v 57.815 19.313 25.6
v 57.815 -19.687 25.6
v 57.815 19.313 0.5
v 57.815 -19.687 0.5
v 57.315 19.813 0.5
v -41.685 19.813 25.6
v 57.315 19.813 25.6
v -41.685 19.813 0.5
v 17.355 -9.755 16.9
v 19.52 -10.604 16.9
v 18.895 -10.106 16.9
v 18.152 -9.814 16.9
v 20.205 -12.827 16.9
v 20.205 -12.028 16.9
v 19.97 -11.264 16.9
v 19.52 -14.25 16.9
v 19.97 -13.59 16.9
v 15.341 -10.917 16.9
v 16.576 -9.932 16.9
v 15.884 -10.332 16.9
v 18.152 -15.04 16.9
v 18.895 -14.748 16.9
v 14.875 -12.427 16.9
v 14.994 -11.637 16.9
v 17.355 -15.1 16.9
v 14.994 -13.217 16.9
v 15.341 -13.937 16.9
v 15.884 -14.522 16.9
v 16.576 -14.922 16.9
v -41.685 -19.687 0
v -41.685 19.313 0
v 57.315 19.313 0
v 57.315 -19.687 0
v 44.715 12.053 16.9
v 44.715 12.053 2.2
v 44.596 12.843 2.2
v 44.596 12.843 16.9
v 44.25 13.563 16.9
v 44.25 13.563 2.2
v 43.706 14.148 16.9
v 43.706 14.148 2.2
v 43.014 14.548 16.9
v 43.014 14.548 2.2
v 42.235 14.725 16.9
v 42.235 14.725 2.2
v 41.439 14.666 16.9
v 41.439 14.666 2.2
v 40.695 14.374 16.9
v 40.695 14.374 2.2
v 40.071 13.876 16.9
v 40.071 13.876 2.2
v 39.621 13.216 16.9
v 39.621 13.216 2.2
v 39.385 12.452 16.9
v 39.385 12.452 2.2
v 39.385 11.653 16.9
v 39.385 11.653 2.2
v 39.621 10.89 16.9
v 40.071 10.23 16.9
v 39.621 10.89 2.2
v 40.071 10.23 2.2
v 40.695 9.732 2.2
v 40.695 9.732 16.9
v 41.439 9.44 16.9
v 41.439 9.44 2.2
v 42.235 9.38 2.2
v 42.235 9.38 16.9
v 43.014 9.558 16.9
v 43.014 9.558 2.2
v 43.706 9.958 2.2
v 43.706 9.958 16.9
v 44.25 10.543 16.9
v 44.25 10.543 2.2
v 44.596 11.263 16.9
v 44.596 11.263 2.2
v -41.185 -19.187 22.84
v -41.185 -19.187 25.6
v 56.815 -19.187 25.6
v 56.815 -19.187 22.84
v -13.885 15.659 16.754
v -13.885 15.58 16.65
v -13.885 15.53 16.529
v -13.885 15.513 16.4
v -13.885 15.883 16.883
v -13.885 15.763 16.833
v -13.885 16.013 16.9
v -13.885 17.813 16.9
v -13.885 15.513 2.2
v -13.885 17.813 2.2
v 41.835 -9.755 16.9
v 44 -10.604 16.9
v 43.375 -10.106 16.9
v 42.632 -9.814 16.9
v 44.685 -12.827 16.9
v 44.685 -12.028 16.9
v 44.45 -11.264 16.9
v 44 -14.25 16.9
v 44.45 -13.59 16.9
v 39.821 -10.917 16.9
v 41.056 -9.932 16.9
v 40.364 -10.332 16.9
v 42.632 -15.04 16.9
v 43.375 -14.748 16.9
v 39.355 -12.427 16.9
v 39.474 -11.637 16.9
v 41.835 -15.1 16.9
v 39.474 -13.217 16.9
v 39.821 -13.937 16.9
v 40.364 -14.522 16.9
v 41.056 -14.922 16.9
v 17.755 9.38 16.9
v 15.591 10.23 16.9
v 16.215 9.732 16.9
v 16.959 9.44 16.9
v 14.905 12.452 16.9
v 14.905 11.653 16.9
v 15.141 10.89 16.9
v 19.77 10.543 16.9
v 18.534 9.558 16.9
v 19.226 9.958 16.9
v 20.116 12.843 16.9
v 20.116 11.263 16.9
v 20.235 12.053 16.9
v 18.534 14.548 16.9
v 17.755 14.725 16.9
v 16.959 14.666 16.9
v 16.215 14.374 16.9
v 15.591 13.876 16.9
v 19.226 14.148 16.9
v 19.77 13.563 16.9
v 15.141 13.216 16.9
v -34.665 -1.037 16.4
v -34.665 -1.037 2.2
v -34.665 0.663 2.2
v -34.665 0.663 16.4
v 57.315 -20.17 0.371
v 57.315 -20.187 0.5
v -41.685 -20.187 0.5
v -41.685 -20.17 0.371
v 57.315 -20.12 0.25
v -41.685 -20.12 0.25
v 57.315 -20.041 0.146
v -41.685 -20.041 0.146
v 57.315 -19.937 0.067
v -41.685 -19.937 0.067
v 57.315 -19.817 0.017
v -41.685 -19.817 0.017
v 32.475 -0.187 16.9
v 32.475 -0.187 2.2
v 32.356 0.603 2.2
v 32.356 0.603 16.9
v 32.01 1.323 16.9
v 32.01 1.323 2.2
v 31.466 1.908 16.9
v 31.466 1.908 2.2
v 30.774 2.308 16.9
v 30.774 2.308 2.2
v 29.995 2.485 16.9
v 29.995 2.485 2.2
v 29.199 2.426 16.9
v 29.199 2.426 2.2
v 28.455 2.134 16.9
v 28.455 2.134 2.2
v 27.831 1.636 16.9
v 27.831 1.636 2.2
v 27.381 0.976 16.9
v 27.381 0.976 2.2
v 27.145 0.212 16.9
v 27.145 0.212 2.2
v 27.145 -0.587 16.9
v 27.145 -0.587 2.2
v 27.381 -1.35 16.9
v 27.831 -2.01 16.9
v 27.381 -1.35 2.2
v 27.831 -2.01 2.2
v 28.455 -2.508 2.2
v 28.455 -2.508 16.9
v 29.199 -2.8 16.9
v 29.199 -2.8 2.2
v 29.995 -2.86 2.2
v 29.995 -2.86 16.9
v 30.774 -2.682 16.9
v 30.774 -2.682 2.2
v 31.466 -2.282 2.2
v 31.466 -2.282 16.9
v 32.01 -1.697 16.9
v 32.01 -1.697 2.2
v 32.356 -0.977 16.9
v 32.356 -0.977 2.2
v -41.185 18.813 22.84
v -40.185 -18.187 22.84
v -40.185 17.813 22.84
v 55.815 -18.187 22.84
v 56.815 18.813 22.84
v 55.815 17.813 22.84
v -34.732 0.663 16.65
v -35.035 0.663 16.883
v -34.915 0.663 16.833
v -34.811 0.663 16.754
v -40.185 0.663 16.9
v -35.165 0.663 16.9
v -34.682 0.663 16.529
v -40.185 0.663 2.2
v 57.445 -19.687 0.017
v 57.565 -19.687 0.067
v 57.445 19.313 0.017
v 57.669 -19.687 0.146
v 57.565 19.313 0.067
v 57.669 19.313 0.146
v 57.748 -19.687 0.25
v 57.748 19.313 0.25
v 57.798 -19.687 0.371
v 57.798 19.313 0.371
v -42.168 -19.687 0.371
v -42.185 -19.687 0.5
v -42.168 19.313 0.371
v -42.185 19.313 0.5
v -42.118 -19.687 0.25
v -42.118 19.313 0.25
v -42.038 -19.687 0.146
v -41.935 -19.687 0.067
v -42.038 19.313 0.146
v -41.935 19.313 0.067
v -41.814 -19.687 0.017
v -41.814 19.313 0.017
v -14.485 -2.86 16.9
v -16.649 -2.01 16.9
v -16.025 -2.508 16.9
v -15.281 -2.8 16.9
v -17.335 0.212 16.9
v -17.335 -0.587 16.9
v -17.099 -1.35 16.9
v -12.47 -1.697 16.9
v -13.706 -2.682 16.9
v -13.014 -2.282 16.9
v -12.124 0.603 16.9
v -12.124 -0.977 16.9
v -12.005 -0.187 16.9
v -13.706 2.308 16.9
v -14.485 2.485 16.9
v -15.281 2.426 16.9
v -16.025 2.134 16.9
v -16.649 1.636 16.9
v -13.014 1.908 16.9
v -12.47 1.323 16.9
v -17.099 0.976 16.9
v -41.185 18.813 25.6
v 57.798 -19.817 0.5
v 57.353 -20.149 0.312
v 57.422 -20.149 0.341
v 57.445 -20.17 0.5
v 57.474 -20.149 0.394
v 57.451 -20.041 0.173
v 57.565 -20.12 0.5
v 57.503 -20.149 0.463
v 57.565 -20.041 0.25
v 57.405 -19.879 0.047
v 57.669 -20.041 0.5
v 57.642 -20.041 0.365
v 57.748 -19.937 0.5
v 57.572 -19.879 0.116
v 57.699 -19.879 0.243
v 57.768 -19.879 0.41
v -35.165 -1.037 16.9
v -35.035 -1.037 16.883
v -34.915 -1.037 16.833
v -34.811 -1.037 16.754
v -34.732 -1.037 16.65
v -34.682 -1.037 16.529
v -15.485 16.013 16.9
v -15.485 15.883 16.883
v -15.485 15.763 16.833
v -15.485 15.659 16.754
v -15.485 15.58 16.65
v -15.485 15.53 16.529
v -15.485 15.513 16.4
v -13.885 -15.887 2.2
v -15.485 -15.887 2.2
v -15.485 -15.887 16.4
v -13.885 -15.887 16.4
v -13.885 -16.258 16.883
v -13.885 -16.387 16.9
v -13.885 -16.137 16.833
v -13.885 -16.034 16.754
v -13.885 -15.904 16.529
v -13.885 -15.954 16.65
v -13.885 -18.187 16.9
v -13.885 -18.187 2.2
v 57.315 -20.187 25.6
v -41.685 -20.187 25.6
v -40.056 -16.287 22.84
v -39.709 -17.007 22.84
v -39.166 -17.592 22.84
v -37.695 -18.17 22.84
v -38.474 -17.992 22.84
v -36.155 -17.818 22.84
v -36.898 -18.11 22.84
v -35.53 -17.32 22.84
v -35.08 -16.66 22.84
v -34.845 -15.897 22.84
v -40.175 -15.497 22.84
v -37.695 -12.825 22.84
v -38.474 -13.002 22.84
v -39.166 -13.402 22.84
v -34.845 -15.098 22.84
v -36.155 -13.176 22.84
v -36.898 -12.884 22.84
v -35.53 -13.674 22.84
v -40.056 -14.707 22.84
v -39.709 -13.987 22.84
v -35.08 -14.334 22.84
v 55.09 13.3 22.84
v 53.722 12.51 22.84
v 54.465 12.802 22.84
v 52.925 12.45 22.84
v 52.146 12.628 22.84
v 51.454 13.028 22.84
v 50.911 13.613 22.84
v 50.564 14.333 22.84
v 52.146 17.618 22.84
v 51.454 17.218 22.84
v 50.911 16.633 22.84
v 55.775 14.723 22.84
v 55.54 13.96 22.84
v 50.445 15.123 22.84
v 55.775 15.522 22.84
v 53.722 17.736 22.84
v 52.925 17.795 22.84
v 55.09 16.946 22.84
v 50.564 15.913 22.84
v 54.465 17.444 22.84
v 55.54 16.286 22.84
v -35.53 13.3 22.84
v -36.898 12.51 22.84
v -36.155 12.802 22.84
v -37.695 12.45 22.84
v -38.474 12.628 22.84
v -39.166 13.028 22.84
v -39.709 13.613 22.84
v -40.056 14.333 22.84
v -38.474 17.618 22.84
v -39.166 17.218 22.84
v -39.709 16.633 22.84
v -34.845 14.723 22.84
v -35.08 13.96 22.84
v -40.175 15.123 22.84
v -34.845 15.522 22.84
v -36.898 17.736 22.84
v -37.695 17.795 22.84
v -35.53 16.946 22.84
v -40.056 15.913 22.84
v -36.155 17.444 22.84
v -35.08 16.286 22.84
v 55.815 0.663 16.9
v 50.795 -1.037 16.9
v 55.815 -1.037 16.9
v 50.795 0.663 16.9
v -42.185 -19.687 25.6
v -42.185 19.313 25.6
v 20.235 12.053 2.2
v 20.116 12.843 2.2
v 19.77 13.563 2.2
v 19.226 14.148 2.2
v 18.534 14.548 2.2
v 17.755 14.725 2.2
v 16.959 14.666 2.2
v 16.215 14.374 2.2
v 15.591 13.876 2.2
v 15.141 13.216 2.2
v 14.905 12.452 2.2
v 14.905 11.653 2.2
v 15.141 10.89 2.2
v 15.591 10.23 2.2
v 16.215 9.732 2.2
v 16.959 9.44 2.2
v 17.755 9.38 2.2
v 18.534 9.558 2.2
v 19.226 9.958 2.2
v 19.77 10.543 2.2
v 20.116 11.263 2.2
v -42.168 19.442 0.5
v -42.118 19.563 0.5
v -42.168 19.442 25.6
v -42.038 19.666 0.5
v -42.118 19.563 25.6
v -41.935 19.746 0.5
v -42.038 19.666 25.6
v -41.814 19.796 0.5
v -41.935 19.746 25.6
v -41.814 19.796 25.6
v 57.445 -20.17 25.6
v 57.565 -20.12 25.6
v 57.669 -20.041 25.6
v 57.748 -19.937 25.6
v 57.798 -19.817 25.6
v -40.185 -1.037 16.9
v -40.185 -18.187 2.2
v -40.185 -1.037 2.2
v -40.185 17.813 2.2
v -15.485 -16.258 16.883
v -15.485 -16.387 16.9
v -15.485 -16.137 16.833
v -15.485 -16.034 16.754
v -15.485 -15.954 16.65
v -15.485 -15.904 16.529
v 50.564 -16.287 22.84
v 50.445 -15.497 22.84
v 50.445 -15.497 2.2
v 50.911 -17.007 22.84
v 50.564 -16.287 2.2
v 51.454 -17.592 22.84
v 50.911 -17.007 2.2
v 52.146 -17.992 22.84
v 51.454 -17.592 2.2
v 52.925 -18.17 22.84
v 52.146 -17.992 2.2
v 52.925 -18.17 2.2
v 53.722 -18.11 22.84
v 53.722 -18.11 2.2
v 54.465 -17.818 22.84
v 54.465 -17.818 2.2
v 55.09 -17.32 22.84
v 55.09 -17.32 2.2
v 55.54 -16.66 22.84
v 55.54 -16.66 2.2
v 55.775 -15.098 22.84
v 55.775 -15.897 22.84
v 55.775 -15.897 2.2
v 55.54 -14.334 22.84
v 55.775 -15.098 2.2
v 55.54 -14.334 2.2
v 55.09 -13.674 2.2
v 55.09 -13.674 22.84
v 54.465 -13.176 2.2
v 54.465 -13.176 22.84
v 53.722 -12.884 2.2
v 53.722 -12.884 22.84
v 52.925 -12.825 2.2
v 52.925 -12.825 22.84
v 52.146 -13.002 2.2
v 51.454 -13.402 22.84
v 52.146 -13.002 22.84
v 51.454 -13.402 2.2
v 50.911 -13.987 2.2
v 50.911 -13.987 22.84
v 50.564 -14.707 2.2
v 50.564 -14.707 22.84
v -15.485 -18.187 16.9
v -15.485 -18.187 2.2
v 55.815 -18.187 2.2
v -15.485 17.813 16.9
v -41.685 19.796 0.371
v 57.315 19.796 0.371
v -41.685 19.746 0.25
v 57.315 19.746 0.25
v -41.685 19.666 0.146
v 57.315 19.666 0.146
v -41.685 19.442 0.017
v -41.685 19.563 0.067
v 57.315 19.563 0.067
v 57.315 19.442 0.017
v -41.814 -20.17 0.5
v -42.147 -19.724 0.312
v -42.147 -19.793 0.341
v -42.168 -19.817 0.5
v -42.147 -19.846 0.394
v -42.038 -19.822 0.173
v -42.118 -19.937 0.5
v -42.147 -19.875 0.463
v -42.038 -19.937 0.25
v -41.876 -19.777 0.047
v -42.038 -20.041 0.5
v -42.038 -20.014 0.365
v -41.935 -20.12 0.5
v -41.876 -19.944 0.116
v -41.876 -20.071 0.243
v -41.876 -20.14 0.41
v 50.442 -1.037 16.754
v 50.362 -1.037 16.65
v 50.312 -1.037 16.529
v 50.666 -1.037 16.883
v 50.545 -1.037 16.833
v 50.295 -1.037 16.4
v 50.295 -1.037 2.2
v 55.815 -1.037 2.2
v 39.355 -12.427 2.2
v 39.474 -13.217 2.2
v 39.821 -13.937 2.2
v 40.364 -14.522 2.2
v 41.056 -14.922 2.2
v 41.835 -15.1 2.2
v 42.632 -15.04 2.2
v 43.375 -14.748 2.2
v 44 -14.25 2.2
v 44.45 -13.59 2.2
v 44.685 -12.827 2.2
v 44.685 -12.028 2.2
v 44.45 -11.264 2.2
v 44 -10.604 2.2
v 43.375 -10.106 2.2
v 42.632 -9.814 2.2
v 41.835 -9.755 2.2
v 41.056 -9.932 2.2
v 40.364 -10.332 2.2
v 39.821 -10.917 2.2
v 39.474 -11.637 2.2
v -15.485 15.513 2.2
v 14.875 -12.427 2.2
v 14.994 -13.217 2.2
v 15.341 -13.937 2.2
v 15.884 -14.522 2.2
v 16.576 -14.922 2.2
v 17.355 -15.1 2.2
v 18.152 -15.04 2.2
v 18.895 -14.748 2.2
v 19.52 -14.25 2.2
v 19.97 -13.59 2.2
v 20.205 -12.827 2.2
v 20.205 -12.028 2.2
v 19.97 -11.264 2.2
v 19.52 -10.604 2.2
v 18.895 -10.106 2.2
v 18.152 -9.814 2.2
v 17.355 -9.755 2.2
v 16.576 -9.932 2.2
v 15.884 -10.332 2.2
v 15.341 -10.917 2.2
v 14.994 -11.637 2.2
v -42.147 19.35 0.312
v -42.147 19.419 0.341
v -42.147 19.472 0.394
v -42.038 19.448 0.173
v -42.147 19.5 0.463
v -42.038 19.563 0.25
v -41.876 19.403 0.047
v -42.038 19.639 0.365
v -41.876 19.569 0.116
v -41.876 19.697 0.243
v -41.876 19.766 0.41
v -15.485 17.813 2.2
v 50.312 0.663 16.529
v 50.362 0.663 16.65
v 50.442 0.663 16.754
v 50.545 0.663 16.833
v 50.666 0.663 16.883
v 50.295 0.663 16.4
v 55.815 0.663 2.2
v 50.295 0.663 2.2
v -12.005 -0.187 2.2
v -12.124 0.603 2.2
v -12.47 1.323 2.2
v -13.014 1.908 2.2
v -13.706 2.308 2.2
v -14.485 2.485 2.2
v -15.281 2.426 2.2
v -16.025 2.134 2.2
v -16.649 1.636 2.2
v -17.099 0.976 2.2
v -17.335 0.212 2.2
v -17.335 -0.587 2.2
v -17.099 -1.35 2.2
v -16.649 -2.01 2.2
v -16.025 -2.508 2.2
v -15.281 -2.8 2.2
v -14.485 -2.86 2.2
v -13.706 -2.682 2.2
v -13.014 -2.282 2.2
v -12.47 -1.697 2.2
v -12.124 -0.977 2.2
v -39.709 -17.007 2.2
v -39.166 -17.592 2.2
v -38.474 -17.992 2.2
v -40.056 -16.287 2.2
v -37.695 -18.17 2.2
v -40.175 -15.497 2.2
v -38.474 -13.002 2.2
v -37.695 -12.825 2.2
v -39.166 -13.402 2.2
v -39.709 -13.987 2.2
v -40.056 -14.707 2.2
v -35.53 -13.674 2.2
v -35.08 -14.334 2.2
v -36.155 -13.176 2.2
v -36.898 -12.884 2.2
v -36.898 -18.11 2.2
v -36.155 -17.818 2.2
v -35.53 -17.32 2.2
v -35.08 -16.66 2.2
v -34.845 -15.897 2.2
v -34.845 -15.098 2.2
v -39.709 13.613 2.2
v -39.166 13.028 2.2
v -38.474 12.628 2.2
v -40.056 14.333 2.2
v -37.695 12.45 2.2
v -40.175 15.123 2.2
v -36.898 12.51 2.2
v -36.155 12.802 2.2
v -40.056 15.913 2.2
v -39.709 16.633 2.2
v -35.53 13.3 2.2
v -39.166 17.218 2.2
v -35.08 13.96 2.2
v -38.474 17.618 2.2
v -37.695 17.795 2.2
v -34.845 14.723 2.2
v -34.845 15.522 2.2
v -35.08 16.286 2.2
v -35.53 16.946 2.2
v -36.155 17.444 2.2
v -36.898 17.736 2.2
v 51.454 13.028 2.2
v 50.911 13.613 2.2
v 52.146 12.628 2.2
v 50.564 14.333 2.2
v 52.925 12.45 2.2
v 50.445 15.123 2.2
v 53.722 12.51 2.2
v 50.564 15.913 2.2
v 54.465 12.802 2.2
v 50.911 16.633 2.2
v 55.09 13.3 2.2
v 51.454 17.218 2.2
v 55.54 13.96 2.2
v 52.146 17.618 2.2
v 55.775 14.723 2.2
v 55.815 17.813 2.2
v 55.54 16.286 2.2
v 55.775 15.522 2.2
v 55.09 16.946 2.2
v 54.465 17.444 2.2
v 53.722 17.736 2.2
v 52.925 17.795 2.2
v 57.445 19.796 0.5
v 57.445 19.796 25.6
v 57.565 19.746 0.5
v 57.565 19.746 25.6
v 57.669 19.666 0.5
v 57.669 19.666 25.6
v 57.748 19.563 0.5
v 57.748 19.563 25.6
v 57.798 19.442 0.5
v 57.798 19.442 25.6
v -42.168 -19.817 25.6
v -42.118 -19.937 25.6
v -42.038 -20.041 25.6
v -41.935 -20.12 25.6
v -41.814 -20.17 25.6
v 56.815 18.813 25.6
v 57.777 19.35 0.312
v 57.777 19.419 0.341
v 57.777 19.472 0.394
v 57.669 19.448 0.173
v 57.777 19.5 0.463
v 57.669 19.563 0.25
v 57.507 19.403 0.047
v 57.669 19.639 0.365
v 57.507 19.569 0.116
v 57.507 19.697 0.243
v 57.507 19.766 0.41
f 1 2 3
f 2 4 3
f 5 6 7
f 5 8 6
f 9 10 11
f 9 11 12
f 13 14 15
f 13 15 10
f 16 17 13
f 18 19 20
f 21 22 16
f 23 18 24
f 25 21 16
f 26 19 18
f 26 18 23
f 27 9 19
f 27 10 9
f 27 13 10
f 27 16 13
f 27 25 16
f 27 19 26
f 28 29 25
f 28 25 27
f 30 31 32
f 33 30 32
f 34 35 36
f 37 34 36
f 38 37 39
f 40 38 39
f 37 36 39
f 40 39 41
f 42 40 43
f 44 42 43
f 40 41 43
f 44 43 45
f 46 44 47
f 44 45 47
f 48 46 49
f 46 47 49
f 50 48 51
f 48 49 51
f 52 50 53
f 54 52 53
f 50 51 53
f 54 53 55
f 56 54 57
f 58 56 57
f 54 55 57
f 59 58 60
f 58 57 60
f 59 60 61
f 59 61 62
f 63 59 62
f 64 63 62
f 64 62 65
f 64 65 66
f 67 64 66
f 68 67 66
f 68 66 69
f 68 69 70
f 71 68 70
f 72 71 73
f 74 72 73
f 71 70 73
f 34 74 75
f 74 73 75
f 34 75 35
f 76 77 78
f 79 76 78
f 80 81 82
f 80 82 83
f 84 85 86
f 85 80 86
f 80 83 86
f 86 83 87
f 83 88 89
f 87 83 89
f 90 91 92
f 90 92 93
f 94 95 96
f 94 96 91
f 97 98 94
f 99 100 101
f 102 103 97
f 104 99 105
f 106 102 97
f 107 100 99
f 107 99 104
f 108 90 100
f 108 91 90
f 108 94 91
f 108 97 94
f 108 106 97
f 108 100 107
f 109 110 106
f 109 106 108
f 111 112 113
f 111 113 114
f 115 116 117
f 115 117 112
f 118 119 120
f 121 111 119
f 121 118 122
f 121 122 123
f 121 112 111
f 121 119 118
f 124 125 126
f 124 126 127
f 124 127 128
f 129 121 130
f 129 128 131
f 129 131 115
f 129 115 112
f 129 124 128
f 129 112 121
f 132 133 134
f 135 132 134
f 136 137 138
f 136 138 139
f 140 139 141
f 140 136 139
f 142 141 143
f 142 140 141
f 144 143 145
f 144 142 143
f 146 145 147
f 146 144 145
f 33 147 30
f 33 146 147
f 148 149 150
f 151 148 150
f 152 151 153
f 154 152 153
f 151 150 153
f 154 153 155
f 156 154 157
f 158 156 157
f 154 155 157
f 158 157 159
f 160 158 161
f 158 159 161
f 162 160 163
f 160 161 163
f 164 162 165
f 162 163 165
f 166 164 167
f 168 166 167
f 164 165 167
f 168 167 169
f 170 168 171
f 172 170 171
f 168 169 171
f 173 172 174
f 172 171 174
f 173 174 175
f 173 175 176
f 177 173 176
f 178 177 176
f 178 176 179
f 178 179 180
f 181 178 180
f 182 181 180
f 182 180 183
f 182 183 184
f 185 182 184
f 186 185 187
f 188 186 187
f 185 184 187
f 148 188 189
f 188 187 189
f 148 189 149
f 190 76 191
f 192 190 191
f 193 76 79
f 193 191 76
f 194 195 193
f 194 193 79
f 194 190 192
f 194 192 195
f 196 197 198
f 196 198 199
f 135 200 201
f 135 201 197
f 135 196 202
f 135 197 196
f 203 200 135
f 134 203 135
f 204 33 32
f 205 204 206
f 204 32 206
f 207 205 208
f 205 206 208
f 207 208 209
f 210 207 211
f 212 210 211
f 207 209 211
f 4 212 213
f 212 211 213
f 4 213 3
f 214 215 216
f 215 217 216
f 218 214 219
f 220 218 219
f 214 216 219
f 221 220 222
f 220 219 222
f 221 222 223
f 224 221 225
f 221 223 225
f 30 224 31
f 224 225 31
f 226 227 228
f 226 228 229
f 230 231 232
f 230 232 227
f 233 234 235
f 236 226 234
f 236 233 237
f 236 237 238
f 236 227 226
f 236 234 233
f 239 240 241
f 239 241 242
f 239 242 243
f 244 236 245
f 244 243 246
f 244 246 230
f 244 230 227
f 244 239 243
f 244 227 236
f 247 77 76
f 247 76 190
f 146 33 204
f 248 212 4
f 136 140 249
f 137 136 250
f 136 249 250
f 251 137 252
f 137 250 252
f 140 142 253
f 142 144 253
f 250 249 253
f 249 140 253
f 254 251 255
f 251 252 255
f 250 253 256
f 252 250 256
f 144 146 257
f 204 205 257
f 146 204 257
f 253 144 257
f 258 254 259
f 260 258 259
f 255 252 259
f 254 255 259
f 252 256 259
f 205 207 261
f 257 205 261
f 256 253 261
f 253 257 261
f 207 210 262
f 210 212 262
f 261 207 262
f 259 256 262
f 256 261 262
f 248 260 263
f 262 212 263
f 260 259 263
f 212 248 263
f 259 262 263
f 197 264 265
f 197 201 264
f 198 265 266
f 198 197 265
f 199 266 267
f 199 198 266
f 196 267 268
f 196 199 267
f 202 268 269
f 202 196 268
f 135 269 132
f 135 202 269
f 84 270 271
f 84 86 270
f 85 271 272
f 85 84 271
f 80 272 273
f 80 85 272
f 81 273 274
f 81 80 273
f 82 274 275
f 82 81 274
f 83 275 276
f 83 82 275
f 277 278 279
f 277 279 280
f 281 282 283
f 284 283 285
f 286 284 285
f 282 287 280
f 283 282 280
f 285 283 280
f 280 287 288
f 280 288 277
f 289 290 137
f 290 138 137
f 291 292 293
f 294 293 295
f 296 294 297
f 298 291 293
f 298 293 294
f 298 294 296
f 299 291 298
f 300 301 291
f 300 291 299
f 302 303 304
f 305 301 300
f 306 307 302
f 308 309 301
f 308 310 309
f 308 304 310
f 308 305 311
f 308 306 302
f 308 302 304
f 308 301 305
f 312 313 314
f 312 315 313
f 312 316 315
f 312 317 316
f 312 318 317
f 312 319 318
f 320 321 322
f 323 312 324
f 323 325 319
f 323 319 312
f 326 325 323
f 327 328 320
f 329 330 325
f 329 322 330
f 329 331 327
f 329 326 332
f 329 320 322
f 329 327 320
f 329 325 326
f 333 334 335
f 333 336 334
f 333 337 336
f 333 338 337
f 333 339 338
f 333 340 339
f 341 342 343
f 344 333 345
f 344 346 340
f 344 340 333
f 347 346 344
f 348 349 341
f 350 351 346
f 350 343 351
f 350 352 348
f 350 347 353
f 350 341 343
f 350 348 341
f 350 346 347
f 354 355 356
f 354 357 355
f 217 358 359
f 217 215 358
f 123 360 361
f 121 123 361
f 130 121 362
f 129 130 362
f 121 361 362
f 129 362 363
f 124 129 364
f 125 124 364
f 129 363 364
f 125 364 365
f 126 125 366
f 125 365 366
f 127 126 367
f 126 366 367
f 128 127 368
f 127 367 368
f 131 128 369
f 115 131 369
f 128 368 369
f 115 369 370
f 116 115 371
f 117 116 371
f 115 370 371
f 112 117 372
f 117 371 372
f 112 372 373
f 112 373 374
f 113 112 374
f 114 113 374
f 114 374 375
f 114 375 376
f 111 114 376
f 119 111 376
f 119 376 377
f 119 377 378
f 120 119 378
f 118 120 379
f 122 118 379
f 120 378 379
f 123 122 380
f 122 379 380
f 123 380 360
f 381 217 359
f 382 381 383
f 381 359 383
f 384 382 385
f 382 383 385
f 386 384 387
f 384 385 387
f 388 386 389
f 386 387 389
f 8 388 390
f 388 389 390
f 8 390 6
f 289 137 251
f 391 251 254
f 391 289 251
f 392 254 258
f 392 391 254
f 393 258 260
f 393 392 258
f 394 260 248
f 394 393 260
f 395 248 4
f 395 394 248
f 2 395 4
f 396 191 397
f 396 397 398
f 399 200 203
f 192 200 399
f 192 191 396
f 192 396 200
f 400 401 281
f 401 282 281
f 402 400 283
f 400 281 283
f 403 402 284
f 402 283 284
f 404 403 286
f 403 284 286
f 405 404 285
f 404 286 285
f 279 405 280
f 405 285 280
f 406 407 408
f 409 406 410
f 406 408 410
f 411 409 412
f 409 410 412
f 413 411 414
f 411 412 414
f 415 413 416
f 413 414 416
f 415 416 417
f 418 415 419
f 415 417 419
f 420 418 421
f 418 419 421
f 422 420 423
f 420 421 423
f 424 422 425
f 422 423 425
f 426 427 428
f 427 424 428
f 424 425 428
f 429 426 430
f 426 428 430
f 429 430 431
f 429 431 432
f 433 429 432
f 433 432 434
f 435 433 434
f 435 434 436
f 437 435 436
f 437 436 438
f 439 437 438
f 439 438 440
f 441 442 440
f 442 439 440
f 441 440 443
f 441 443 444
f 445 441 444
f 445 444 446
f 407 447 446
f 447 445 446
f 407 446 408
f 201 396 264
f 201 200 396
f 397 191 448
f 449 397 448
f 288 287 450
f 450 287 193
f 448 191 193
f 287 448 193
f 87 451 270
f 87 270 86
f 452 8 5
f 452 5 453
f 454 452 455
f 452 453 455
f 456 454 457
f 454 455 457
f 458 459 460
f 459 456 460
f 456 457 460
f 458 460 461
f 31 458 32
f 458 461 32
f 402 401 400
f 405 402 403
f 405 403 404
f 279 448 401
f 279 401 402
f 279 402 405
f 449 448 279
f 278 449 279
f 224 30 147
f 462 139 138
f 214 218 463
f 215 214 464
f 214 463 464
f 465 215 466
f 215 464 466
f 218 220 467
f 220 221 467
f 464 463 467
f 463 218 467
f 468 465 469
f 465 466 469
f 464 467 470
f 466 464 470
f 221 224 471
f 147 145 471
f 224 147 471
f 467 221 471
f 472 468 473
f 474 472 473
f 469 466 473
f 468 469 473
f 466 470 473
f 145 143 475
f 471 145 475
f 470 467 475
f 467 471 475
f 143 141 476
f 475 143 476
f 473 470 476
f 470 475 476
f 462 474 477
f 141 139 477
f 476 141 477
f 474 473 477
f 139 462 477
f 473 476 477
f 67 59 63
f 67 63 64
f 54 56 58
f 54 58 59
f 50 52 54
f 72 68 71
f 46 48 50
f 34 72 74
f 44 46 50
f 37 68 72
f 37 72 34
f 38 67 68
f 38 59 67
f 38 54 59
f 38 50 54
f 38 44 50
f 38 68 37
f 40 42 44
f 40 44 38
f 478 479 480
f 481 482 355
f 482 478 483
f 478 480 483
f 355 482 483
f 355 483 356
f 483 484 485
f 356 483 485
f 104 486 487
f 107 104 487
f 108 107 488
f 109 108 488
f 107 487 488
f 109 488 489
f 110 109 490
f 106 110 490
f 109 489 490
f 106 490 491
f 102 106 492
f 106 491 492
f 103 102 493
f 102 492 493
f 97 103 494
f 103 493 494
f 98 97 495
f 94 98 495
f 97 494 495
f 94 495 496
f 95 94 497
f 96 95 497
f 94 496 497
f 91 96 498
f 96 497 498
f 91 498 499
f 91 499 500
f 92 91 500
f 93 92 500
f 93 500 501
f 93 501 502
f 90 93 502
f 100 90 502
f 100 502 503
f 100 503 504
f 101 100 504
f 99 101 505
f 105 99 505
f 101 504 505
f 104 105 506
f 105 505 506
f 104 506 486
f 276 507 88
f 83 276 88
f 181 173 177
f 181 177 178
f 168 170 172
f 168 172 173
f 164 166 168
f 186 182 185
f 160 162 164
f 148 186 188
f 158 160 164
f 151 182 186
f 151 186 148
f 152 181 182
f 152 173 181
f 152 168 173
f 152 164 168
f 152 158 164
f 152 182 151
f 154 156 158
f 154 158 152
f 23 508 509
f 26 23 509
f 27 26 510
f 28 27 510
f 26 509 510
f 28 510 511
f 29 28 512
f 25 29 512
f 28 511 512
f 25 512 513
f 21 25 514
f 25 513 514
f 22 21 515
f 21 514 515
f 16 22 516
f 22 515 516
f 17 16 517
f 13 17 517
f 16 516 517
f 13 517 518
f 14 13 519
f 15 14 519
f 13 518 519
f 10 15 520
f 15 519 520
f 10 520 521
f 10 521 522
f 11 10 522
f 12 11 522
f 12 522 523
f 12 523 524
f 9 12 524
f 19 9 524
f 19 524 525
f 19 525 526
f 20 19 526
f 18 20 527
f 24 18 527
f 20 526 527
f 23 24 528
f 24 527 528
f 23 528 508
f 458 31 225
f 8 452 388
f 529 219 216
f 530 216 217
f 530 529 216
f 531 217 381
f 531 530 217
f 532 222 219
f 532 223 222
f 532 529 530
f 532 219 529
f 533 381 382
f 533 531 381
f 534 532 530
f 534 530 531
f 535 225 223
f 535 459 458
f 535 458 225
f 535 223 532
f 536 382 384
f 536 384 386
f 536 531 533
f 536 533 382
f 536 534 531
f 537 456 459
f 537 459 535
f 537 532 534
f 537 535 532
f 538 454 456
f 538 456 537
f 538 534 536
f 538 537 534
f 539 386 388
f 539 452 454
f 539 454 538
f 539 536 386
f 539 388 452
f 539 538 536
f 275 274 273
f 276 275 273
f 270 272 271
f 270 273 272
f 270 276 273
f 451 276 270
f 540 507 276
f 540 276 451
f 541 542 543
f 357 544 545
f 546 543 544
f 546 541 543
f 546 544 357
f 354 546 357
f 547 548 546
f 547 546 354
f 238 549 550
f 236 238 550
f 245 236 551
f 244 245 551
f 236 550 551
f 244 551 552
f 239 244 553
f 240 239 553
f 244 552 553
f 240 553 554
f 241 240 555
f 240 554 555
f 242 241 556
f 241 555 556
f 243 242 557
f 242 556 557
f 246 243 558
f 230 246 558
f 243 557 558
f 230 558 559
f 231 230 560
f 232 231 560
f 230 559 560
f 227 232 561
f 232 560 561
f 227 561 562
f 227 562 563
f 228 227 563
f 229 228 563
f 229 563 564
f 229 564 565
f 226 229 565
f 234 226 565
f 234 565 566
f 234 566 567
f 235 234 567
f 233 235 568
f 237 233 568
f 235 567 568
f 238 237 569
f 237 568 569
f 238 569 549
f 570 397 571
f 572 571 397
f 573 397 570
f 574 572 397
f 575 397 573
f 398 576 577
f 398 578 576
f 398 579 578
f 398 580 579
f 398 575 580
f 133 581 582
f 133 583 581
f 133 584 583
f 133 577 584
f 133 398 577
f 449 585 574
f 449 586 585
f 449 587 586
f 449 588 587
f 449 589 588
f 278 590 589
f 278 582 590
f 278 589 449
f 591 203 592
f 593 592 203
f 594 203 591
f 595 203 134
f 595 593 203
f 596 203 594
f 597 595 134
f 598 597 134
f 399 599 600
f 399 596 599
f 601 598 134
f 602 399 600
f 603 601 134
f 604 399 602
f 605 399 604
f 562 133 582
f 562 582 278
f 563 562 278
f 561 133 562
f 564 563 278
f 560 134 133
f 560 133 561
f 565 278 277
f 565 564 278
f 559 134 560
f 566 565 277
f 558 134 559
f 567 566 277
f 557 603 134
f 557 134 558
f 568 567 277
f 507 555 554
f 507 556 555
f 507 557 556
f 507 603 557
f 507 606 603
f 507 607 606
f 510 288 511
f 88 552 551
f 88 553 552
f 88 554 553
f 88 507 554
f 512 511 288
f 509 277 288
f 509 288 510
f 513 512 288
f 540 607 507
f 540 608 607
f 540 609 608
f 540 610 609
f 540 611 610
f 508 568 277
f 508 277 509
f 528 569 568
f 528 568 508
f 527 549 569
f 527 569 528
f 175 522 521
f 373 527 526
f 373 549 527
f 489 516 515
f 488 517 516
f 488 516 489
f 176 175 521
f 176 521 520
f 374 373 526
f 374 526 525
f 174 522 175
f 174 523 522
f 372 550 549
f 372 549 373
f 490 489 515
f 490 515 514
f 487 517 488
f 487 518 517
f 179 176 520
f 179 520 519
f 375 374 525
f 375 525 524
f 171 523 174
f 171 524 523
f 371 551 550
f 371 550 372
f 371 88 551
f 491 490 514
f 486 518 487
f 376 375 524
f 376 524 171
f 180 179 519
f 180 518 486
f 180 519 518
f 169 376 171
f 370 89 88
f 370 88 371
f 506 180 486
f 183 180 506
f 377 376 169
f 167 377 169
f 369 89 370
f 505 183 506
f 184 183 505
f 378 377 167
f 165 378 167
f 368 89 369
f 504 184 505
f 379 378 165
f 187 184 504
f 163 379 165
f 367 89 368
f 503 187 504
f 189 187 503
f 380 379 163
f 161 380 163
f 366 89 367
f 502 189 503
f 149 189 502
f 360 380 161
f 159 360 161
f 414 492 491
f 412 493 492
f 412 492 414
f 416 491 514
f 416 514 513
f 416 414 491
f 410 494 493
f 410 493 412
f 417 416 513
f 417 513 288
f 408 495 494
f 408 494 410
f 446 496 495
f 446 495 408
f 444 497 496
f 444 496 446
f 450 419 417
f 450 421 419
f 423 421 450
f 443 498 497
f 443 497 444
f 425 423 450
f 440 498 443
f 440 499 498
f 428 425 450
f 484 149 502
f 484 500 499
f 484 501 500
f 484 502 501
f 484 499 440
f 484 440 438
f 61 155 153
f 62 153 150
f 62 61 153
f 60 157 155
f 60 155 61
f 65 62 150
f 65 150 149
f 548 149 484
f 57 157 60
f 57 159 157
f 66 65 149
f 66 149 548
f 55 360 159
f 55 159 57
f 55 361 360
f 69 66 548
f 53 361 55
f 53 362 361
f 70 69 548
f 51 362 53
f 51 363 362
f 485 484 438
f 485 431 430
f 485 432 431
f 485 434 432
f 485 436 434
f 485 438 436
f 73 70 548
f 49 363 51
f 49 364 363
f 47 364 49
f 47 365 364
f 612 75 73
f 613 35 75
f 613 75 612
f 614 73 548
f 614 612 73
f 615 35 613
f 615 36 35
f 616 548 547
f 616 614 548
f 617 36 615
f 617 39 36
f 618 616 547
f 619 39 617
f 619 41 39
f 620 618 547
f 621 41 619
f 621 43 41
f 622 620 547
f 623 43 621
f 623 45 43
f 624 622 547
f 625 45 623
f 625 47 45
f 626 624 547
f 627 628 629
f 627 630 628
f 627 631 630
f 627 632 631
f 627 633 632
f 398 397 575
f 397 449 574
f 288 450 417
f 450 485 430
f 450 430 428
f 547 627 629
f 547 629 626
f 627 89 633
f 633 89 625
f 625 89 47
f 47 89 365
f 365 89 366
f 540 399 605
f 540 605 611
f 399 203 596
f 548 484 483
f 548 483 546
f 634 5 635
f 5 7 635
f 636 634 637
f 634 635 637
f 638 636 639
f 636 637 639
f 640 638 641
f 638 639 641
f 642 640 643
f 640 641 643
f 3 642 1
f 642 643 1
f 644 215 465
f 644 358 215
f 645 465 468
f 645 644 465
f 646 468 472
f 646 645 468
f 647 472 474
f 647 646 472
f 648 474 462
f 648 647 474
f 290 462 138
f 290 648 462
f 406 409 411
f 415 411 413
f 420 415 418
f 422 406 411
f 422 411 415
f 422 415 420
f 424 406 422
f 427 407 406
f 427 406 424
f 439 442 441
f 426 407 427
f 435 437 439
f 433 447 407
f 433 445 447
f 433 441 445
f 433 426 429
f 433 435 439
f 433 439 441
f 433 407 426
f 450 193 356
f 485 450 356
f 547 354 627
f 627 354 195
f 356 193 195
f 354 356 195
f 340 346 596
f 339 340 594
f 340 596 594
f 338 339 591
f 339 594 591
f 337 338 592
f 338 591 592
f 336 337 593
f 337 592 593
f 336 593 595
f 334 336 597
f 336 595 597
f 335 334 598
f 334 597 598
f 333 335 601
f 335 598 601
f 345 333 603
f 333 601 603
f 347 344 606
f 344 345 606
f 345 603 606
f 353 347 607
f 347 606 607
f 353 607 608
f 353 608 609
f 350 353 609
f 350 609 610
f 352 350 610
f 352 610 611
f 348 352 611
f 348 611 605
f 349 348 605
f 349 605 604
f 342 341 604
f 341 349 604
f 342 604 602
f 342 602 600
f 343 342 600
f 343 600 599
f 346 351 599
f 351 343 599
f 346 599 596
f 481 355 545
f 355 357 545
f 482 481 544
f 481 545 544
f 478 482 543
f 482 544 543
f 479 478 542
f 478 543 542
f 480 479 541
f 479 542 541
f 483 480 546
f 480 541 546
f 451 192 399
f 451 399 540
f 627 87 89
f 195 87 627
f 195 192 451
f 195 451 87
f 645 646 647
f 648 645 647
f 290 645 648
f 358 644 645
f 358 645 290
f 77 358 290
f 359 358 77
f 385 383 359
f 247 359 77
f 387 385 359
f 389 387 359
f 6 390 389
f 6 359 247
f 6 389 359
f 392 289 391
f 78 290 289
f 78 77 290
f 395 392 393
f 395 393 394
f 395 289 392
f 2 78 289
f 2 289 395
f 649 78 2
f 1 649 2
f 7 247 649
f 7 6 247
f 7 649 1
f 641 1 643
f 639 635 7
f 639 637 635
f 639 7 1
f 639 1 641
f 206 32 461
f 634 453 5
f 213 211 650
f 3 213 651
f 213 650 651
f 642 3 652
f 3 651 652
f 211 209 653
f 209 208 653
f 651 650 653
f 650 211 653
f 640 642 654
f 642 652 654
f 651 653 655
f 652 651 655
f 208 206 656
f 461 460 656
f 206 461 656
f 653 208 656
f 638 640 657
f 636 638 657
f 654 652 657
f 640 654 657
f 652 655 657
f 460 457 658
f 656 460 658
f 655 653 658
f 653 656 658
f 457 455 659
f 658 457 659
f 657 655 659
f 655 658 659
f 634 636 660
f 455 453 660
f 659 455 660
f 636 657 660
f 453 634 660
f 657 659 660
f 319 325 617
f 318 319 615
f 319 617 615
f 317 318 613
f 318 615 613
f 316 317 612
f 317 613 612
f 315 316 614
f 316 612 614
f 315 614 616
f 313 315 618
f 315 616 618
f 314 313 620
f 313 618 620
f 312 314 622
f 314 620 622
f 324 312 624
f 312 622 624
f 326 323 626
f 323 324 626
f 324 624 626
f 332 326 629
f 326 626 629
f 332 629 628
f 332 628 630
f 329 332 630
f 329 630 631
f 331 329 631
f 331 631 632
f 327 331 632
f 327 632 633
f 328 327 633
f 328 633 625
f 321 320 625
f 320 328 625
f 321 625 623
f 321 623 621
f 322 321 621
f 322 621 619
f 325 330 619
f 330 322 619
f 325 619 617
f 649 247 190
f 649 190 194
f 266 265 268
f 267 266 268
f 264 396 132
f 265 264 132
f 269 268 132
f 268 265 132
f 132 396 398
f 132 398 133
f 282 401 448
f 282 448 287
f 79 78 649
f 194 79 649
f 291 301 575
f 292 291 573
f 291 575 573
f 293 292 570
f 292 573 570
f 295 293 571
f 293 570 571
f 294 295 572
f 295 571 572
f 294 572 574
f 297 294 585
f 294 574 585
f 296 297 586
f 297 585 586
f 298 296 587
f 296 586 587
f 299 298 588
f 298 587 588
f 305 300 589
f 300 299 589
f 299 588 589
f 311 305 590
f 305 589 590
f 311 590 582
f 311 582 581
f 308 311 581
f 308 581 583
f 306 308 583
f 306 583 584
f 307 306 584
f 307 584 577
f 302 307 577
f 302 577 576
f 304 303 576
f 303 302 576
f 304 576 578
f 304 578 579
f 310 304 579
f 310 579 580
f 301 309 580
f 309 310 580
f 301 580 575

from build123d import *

# Parameters (mm, degrees)
IZIM1_W                     = 100
IZIM1_H                     = 40
Y_KSEKLIK_EKSTR_ZYON1_DEPTH = 25.6
IZIM2_W                     = 96
IZIM2_H                     = 36
KES_EKSTR_ZYON1_DEPTH       = 23.4
IZIM5_R                     = 2.68
Y_KSEKLIK_EKSTR_ZYON6_DEPTH = 22.42
IZIM6_W                     = 98
IZIM6_H                     = 38
KES_EKSTR_ZYON2_DEPTH       = 2.76
IZIM7_W                     = 5.52
IZIM7_H                     = 1.7
Y_KSEKLIK_EKSTR_ZYON7_DEPTH = 14.7
IZIM8_W                     = 1.6
IZIM8_H                     = 2.3
Y_KSEKLIK_EKSTR_ZYON8_DEPTH = 14.7
IZIM9_R                     = 2.68
Y_KSEKLIK_EKSTR_ZYON9_DEPTH = 14.7
RADYUS1_R                   = 0.5


with BuildPart() as part:
    # Çizim1 → Yükseklik-Ekstrüzyon1 (new body)
    with BuildSketch(Plane.XY):
        with Locations((7.815221761, -0.187165775)):
            Rectangle(IZIM1_W, IZIM1_H)
    extrude(amount=Y_KSEKLIK_EKSTR_ZYON1_DEPTH)

    # Çizim2 → Kes-Ekstrüzyon1 (cut)
    with BuildSketch(Plane.XY.offset(25.6)):
        with Locations((7.815221761, -0.187165775)):
            Rectangle(IZIM2_W, IZIM2_H)
    extrude(amount=-KES_EKSTR_ZYON1_DEPTH, mode=Mode.SUBTRACT)

    # Çizim5 → Yükseklik-Ekstrüzyon6 (add)
    with BuildSketch(Plane.XY.offset(2.2)):
        with Locations(Location((-37.494778239, 15.122834225, 0), (0, 0, 180))):
            Circle(IZIM5_R)
        with Locations(Location((-37.494778239, -15.497165775, 0), (0, 0, 180))):
            Circle(IZIM5_R)
        with Locations(Location((53.125221761, -15.497165775, 0), (0, 0, 180))):
            Circle(IZIM5_R)
        with Locations(Location((53.125221761, 15.122834225, 0), (0, 0, 180))):
            Circle(IZIM5_R)
    extrude(amount=Y_KSEKLIK_EKSTR_ZYON6_DEPTH)

    # Çizim6 → Kes-Ekstrüzyon2 (cut)
    with BuildSketch(Plane.XY.offset(25.6)):
        with Locations((7.815221761, -0.187165775)):
            Rectangle(IZIM6_W, IZIM6_H)
    extrude(amount=-KES_EKSTR_ZYON2_DEPTH, mode=Mode.SUBTRACT)

    # Çizim7 → Yükseklik-Ekstrüzyon7 (add)
    with BuildSketch(Plane.XY.offset(2.2)):
        with Locations((53.055221761, -0.187165775)):
            Rectangle(IZIM7_W, IZIM7_H)
        with Locations((-37.424778239, -0.187165775)):
            Rectangle(IZIM7_W, IZIM7_H)
    extrude(amount=Y_KSEKLIK_EKSTR_ZYON7_DEPTH)

    # Çizim8 → Yükseklik-Ekstrüzyon8 (add)
    with BuildSketch(Plane.XY.offset(2.2)):
        with Locations((-14.684778239, 16.662834225)):
            Rectangle(IZIM8_W, IZIM8_H)
        with Locations((-14.684778239, -17.037165775)):
            Rectangle(IZIM8_W, IZIM8_H)
    extrude(amount=Y_KSEKLIK_EKSTR_ZYON8_DEPTH)

    # Çizim9 → Yükseklik-Ekstrüzyon9 (add)
    with BuildSketch(Plane.XY.offset(2.2)):
        with Locations((42.035221761, 12.052834225)):
            Circle(IZIM9_R)
        with Locations(Location((42.035221761, -12.427165775, 0), (0, 0, 180))):
            Circle(IZIM9_R)
        with Locations((17.555221761, 12.052834225)):
            Circle(IZIM9_R)
        with Locations(Location((17.555221761, -12.427165775, 0), (0, 0, 180))):
            Circle(IZIM9_R)
        with Locations((29.795221761, -0.187165775)):
            Circle(IZIM9_R)
        with Locations((-14.684778239, -0.187165775)):
            Circle(IZIM9_R)
    extrude(amount=Y_KSEKLIK_EKSTR_ZYON9_DEPTH)

    # Radyus1
    radyus1_edges = [part.edges().sort_by_distance(p)[0] for p in [
        (-34.664778239, -0.187165775, 16.9),
        (-14.684778239, 15.512834225, 16.9),
        (-14.684778239, -15.887165775, 16.9),
        (7.815221761, 19.812834225, 0),
        (57.815221761, -0.187165775, 0),
        (7.815221761, -20.187165775, 0),
        (-42.184778239, -0.187165775, 0),
        (-42.184778239, 19.812834225, 12.8),
        (57.815221761, 19.812834225, 12.8),
        (57.815221761, -20.187165775, 12.8),
        (-42.184778239, -20.187165775, 12.8),
        (50.295221761, -0.187165775, 16.9),
    ]]
    fillet(radyus1_edges, radius=RADYUS1_R)


solid = part.part
